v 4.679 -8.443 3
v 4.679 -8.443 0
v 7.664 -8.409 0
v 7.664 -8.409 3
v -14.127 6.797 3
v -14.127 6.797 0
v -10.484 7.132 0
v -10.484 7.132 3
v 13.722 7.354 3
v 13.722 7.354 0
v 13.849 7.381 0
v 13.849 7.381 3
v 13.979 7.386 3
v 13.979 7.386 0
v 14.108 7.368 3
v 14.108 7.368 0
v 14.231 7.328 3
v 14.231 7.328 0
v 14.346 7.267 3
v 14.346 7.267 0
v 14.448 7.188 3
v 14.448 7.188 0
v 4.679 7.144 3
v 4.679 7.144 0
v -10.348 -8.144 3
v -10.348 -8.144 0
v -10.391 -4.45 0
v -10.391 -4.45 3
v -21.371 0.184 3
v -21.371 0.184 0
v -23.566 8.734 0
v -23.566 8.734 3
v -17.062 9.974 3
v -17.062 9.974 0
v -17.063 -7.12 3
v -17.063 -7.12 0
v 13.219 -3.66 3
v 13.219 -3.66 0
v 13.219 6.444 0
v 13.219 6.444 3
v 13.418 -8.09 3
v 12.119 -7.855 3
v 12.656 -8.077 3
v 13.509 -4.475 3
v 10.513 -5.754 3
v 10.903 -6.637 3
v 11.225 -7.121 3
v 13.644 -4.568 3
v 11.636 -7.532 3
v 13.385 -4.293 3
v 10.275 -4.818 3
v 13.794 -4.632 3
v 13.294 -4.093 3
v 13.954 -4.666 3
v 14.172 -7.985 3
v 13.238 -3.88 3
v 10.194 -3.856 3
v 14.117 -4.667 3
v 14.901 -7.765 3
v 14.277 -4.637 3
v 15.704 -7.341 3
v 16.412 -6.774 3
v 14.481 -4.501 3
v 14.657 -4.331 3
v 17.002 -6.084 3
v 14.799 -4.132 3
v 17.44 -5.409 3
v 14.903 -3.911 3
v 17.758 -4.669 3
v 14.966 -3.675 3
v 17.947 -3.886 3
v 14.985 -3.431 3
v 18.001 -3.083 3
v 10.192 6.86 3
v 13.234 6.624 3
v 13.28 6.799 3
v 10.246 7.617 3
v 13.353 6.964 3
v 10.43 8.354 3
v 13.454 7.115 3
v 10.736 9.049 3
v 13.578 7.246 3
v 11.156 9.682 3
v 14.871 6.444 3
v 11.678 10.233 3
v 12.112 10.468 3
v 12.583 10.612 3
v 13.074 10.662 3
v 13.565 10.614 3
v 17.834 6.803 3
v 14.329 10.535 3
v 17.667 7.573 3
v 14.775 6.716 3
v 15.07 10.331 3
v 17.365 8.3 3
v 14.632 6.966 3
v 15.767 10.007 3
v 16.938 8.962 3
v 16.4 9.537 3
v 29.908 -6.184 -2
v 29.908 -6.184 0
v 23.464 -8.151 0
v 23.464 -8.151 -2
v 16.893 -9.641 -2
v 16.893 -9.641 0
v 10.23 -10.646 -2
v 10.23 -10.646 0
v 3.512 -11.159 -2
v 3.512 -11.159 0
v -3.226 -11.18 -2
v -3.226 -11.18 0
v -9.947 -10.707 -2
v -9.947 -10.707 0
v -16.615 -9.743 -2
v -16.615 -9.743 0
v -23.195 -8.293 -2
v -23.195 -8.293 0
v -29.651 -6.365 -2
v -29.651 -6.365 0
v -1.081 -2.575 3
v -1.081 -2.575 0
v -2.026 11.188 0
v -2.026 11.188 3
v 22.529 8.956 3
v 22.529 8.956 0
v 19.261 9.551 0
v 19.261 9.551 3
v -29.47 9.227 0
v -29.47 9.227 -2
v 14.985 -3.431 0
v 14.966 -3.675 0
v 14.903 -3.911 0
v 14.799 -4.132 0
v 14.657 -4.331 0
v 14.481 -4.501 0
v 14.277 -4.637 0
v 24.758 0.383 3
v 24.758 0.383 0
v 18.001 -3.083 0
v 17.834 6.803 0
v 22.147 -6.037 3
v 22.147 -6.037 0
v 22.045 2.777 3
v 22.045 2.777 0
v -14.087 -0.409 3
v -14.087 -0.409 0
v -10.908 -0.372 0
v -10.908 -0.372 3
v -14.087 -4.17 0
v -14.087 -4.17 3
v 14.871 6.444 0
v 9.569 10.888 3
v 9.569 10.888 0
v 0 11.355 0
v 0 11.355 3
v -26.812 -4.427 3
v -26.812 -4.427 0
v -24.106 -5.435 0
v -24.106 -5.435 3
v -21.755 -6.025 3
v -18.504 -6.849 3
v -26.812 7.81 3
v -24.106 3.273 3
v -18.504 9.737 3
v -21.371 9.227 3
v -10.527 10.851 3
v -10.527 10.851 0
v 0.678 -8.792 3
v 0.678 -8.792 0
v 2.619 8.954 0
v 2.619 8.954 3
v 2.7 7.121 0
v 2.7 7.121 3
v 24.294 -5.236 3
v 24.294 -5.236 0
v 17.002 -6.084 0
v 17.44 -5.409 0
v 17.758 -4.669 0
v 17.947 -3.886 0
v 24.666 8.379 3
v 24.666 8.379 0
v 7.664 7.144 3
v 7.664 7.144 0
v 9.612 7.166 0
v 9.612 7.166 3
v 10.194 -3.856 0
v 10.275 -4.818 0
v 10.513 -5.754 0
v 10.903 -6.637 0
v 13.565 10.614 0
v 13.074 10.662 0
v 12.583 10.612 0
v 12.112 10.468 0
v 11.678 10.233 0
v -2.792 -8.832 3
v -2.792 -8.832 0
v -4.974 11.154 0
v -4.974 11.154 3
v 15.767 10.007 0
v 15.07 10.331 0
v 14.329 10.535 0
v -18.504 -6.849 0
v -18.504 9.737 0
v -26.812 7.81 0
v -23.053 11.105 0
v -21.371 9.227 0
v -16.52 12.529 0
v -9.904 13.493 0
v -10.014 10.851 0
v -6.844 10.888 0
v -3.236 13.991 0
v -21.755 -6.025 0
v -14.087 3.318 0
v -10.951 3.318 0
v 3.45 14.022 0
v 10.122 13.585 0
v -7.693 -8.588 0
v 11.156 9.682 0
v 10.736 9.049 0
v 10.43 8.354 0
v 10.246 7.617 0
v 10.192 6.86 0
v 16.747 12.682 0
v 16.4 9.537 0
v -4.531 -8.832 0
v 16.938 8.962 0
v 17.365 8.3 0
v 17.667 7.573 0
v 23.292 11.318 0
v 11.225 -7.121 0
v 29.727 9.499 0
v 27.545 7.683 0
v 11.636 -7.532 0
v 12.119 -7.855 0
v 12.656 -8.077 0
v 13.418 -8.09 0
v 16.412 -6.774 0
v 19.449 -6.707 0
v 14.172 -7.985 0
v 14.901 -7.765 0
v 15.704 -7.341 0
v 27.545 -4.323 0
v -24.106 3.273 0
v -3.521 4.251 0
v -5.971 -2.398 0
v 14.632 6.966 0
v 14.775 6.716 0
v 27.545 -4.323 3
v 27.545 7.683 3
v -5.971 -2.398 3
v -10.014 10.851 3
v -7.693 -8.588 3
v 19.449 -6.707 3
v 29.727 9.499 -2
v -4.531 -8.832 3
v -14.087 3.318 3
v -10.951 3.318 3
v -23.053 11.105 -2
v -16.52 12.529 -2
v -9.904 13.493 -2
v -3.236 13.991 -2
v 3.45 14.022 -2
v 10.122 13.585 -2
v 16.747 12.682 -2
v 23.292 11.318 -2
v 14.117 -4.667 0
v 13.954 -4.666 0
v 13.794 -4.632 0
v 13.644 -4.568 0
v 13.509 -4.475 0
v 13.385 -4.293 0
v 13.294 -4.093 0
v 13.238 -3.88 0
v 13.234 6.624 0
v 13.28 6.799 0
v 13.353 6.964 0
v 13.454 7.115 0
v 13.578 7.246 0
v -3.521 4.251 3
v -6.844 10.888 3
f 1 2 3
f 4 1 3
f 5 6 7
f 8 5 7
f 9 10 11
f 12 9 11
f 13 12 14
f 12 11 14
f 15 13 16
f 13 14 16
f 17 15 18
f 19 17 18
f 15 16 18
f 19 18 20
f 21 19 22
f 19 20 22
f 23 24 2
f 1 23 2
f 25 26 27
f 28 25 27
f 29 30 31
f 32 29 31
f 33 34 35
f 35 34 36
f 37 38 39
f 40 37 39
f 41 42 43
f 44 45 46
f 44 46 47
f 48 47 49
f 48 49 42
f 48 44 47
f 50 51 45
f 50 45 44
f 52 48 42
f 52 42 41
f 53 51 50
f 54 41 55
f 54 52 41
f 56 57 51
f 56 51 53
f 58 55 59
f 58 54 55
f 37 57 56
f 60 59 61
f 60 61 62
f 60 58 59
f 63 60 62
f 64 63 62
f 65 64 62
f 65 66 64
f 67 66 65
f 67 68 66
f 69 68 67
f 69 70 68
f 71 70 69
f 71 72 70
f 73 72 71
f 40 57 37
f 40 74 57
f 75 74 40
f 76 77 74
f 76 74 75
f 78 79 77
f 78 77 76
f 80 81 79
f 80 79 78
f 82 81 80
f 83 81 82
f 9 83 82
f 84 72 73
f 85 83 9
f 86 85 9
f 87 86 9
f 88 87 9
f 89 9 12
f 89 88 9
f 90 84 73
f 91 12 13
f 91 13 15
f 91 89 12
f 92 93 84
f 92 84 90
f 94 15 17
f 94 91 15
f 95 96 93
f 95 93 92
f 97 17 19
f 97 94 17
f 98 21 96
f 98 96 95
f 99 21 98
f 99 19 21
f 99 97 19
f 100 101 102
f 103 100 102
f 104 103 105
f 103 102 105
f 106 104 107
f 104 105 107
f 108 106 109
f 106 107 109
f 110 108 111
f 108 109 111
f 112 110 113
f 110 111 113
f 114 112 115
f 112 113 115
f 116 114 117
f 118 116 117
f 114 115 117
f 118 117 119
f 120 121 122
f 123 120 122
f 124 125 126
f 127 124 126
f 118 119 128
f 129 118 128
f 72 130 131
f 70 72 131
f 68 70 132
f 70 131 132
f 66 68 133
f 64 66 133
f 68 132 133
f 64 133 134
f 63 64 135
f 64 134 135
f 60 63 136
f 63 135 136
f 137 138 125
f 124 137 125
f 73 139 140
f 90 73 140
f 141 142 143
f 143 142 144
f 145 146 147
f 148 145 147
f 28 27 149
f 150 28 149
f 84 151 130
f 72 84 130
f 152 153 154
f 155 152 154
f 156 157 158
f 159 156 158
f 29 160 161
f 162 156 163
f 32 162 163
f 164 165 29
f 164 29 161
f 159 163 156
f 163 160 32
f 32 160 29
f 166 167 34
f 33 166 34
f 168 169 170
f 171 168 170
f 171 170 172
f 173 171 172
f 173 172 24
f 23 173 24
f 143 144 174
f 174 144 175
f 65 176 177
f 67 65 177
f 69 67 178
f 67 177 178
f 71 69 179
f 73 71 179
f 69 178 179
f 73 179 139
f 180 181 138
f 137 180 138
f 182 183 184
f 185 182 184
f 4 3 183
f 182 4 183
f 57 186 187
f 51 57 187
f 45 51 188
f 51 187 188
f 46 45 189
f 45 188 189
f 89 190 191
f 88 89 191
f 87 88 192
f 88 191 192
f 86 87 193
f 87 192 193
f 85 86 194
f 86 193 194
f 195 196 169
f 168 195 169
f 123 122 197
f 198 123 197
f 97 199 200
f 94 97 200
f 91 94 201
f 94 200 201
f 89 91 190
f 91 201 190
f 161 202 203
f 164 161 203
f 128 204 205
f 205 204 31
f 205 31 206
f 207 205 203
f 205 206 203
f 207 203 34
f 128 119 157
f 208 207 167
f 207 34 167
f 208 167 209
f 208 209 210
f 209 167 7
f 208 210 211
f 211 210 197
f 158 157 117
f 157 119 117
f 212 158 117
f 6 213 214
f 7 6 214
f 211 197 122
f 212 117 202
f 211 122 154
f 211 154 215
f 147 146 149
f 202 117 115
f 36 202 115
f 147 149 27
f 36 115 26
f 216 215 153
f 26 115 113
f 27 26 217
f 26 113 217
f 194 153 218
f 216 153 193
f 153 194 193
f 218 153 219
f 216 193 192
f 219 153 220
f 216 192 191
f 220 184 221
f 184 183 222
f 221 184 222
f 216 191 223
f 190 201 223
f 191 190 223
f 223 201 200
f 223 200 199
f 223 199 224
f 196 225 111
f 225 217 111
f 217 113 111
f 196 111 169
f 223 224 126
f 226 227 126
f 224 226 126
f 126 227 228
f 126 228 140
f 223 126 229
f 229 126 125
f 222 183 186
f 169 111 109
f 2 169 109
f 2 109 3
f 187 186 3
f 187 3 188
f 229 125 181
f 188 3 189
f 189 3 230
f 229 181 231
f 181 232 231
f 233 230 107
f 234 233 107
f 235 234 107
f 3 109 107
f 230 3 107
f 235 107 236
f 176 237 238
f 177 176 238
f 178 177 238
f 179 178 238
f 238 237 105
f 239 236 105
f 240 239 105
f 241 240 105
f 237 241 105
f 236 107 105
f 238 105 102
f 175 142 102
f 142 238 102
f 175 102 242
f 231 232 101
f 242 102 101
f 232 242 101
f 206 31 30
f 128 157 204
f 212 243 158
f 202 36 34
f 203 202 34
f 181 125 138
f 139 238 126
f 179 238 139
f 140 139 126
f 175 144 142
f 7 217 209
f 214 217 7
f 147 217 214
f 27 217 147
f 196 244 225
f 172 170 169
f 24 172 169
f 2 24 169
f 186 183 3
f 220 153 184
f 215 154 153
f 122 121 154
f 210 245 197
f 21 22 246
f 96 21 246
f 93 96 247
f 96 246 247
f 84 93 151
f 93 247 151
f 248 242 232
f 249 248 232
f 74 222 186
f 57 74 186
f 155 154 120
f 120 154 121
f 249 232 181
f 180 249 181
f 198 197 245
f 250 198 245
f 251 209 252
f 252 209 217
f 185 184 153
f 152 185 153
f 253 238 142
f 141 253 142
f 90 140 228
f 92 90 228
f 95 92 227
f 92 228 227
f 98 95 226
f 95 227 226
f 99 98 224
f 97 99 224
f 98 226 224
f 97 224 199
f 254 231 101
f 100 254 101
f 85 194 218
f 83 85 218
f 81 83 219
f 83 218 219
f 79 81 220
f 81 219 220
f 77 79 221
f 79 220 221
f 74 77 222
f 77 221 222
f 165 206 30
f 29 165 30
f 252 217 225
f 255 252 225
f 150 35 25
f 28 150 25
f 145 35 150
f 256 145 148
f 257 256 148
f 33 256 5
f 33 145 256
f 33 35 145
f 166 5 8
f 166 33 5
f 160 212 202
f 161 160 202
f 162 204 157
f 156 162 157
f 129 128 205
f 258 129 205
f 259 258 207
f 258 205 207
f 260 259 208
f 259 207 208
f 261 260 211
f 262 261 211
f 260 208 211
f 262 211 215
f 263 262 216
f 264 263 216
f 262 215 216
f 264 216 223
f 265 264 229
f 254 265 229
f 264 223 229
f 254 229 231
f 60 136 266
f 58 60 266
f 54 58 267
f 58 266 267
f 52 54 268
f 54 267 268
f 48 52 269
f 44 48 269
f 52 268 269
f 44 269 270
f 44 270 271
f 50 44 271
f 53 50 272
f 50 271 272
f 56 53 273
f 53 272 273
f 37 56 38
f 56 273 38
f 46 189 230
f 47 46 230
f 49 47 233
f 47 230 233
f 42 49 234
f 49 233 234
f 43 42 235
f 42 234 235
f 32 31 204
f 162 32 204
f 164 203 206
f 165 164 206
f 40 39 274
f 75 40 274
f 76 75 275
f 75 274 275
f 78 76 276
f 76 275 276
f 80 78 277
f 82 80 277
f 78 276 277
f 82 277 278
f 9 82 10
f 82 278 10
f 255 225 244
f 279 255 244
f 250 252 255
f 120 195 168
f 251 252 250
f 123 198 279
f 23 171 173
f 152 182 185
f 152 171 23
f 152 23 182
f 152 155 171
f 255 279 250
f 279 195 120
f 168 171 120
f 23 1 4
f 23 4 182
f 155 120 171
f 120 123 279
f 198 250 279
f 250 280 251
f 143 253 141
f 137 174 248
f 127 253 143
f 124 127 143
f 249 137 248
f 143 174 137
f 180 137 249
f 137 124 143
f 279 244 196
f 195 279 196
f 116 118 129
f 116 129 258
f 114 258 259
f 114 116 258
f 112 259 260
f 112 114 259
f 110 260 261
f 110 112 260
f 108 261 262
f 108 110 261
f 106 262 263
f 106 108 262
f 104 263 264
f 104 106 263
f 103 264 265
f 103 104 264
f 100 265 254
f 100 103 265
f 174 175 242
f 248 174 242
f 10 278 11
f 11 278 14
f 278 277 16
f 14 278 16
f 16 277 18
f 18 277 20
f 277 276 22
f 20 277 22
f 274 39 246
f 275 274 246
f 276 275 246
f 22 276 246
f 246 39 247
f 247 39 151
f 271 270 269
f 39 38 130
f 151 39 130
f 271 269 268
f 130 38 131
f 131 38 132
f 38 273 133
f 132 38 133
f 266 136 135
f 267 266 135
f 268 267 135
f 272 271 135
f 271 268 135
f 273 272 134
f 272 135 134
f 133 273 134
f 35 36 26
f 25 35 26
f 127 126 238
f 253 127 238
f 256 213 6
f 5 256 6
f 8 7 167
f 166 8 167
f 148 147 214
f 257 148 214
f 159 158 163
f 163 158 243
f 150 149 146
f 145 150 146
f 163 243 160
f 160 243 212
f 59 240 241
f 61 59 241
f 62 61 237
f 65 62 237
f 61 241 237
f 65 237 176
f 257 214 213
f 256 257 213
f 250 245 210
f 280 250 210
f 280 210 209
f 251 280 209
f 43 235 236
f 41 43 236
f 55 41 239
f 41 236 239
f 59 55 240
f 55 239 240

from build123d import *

# Parameters (mm, degrees)
F1_DEPTH = 3
F3_DEPTH = 2


with BuildPart() as f1:
    # F0 (on Top) → F1 (new body)
    with BuildSketch(Plane.XY):
        Polygon((-23.565747, 8.733586), (-26.811946, 7.810456), (-26.811946, -4.42697), (-24.105687, -5.435429), (-24.105687, 3.273411), (-21.755431, -6.025282), (-18.503955, -6.848847), (-18.503955, 9.736739), (-21.37113, 9.227031), (-21.37113, 0.183831), align=None)
        Polygon((-10.527196, 10.851217), (-17.061597, 9.973913), (-17.063336, -7.120089), (-10.348095, -8.144408), (-10.390801, -4.450301), (-14.086946, -4.170476), (-14.086946, -0.409178), (-10.908057, -0.372427), (-10.950724, 3.318271), (-14.086946, 3.318271), (-14.127168, 6.797468), (-10.484197, 7.131785), align=None)
        Polygon((-6.843771, 10.887864), (-10.013774, 10.851217), (-7.693077, -8.587812), (-4.531018, -8.831803), (-3.521484, 4.251498), (-2.791821, -8.831803), (0.67818, -8.791688), (2.618703, 8.953662), (2.700111, 7.121005), (4.679172, 7.143884), (4.679172, -8.443333), (7.66364, -8.408831), (7.66364, 7.143884), (9.612382, 7.166413), (9.569359, 10.887864), (0, 11.354624), (-1.080738, -2.574903), (-2.025757, 11.187691), (-4.974215, 11.153605), (-5.970521, -2.398258), align=None)
        Polygon((22.529045, 8.955718), (19.260596, 9.551114), (19.448553, -6.707126), (22.146616, -6.036957), (22.044722, 2.776925), (24.294013, -5.235689), (27.544877, -4.323111), (27.544877, 7.68314), (24.666015, 8.379457), (24.758457, 0.383226), align=None)
        with BuildLine():
            ThreePointArc((13.56484, 10.614374), (12.58338, 10.612468), (11.67815, 10.233224))
            ThreePointArc((11.67815, 10.233224), (10.567721, 8.708449), (10.191667, 6.860051))
            Line((10.191667, 6.860051), (10.194493, -3.856149))
            ThreePointArc((10.194493, -3.856149), (10.374655, -5.290787), (10.903246, -6.636608))
            ThreePointArc((10.903246, -6.636608), (11.635651, -7.532128), (12.656043, -8.077263))
            ThreePointArc((12.656043, -8.077263), (13.79671, -8.051781), (14.901063, -7.765121))
            ThreePointArc((14.901063, -7.765121), (16.071482, -7.074666), (17.002018, -6.084357))
            ThreePointArc((17.002018, -6.084357), (17.757929, -4.668834), (18.001225, -3.082671))
            Line((18.001225, -3.082671), (17.833713, 6.802879))
            ThreePointArc((17.833713, 6.802879), (17.166492, 8.640981), (15.767285, 10.007006))
            ThreePointArc((15.767285, 10.007006), (14.704057, 10.448465), (13.56484, 10.614374))
        make_face()
        with BuildLine():
            Line((13.219225, -3.660286), (13.219225, 6.444435))
            ThreePointArc((13.219225, 6.444435), (13.353404, 6.964312), (13.722419, 7.354317))
            ThreePointArc((13.722419, 7.354317), (14.10761, 7.367864), (14.448463, 7.187932))
            ThreePointArc((14.448463, 7.187932), (14.708863, 6.844124), (14.870914, 6.444435))
            Line((14.870914, 6.444435), (14.98508, -3.430936))
            ThreePointArc((14.98508, -3.430936), (14.798828, -4.132397), (14.277328, -4.637151))
            ThreePointArc((14.277328, -4.637151), (13.87296, -4.652777), (13.509215, -4.475443))
            ThreePointArc((13.509215, -4.475443), (13.293882, -4.092887), (13.219225, -3.660286))
        make_face(mode=Mode.SUBTRACT)
    extrude(amount=F1_DEPTH)

    # F2 (on face) → F3 (join)
    with BuildSketch(Plane(origin=(0, 0, 0), x_dir=(1, 0, 0), z_dir=(0, 0, -1))):
        with BuildLine():
            Line((29.726516, -9.49899), (29.907823, 6.184002))
            ThreePointArc((29.907823, 6.184002), (0.143357, 11.231437), (-29.651286, 6.365308))
            Line((-29.651286, 6.365308), (-29.46998, -9.227031))
            ThreePointArc((-29.46998, -9.227031), (0.106665, -14.06537), (29.726516, -9.49899))
        make_face()
    extrude(amount=F3_DEPTH)


solid = f1.part
